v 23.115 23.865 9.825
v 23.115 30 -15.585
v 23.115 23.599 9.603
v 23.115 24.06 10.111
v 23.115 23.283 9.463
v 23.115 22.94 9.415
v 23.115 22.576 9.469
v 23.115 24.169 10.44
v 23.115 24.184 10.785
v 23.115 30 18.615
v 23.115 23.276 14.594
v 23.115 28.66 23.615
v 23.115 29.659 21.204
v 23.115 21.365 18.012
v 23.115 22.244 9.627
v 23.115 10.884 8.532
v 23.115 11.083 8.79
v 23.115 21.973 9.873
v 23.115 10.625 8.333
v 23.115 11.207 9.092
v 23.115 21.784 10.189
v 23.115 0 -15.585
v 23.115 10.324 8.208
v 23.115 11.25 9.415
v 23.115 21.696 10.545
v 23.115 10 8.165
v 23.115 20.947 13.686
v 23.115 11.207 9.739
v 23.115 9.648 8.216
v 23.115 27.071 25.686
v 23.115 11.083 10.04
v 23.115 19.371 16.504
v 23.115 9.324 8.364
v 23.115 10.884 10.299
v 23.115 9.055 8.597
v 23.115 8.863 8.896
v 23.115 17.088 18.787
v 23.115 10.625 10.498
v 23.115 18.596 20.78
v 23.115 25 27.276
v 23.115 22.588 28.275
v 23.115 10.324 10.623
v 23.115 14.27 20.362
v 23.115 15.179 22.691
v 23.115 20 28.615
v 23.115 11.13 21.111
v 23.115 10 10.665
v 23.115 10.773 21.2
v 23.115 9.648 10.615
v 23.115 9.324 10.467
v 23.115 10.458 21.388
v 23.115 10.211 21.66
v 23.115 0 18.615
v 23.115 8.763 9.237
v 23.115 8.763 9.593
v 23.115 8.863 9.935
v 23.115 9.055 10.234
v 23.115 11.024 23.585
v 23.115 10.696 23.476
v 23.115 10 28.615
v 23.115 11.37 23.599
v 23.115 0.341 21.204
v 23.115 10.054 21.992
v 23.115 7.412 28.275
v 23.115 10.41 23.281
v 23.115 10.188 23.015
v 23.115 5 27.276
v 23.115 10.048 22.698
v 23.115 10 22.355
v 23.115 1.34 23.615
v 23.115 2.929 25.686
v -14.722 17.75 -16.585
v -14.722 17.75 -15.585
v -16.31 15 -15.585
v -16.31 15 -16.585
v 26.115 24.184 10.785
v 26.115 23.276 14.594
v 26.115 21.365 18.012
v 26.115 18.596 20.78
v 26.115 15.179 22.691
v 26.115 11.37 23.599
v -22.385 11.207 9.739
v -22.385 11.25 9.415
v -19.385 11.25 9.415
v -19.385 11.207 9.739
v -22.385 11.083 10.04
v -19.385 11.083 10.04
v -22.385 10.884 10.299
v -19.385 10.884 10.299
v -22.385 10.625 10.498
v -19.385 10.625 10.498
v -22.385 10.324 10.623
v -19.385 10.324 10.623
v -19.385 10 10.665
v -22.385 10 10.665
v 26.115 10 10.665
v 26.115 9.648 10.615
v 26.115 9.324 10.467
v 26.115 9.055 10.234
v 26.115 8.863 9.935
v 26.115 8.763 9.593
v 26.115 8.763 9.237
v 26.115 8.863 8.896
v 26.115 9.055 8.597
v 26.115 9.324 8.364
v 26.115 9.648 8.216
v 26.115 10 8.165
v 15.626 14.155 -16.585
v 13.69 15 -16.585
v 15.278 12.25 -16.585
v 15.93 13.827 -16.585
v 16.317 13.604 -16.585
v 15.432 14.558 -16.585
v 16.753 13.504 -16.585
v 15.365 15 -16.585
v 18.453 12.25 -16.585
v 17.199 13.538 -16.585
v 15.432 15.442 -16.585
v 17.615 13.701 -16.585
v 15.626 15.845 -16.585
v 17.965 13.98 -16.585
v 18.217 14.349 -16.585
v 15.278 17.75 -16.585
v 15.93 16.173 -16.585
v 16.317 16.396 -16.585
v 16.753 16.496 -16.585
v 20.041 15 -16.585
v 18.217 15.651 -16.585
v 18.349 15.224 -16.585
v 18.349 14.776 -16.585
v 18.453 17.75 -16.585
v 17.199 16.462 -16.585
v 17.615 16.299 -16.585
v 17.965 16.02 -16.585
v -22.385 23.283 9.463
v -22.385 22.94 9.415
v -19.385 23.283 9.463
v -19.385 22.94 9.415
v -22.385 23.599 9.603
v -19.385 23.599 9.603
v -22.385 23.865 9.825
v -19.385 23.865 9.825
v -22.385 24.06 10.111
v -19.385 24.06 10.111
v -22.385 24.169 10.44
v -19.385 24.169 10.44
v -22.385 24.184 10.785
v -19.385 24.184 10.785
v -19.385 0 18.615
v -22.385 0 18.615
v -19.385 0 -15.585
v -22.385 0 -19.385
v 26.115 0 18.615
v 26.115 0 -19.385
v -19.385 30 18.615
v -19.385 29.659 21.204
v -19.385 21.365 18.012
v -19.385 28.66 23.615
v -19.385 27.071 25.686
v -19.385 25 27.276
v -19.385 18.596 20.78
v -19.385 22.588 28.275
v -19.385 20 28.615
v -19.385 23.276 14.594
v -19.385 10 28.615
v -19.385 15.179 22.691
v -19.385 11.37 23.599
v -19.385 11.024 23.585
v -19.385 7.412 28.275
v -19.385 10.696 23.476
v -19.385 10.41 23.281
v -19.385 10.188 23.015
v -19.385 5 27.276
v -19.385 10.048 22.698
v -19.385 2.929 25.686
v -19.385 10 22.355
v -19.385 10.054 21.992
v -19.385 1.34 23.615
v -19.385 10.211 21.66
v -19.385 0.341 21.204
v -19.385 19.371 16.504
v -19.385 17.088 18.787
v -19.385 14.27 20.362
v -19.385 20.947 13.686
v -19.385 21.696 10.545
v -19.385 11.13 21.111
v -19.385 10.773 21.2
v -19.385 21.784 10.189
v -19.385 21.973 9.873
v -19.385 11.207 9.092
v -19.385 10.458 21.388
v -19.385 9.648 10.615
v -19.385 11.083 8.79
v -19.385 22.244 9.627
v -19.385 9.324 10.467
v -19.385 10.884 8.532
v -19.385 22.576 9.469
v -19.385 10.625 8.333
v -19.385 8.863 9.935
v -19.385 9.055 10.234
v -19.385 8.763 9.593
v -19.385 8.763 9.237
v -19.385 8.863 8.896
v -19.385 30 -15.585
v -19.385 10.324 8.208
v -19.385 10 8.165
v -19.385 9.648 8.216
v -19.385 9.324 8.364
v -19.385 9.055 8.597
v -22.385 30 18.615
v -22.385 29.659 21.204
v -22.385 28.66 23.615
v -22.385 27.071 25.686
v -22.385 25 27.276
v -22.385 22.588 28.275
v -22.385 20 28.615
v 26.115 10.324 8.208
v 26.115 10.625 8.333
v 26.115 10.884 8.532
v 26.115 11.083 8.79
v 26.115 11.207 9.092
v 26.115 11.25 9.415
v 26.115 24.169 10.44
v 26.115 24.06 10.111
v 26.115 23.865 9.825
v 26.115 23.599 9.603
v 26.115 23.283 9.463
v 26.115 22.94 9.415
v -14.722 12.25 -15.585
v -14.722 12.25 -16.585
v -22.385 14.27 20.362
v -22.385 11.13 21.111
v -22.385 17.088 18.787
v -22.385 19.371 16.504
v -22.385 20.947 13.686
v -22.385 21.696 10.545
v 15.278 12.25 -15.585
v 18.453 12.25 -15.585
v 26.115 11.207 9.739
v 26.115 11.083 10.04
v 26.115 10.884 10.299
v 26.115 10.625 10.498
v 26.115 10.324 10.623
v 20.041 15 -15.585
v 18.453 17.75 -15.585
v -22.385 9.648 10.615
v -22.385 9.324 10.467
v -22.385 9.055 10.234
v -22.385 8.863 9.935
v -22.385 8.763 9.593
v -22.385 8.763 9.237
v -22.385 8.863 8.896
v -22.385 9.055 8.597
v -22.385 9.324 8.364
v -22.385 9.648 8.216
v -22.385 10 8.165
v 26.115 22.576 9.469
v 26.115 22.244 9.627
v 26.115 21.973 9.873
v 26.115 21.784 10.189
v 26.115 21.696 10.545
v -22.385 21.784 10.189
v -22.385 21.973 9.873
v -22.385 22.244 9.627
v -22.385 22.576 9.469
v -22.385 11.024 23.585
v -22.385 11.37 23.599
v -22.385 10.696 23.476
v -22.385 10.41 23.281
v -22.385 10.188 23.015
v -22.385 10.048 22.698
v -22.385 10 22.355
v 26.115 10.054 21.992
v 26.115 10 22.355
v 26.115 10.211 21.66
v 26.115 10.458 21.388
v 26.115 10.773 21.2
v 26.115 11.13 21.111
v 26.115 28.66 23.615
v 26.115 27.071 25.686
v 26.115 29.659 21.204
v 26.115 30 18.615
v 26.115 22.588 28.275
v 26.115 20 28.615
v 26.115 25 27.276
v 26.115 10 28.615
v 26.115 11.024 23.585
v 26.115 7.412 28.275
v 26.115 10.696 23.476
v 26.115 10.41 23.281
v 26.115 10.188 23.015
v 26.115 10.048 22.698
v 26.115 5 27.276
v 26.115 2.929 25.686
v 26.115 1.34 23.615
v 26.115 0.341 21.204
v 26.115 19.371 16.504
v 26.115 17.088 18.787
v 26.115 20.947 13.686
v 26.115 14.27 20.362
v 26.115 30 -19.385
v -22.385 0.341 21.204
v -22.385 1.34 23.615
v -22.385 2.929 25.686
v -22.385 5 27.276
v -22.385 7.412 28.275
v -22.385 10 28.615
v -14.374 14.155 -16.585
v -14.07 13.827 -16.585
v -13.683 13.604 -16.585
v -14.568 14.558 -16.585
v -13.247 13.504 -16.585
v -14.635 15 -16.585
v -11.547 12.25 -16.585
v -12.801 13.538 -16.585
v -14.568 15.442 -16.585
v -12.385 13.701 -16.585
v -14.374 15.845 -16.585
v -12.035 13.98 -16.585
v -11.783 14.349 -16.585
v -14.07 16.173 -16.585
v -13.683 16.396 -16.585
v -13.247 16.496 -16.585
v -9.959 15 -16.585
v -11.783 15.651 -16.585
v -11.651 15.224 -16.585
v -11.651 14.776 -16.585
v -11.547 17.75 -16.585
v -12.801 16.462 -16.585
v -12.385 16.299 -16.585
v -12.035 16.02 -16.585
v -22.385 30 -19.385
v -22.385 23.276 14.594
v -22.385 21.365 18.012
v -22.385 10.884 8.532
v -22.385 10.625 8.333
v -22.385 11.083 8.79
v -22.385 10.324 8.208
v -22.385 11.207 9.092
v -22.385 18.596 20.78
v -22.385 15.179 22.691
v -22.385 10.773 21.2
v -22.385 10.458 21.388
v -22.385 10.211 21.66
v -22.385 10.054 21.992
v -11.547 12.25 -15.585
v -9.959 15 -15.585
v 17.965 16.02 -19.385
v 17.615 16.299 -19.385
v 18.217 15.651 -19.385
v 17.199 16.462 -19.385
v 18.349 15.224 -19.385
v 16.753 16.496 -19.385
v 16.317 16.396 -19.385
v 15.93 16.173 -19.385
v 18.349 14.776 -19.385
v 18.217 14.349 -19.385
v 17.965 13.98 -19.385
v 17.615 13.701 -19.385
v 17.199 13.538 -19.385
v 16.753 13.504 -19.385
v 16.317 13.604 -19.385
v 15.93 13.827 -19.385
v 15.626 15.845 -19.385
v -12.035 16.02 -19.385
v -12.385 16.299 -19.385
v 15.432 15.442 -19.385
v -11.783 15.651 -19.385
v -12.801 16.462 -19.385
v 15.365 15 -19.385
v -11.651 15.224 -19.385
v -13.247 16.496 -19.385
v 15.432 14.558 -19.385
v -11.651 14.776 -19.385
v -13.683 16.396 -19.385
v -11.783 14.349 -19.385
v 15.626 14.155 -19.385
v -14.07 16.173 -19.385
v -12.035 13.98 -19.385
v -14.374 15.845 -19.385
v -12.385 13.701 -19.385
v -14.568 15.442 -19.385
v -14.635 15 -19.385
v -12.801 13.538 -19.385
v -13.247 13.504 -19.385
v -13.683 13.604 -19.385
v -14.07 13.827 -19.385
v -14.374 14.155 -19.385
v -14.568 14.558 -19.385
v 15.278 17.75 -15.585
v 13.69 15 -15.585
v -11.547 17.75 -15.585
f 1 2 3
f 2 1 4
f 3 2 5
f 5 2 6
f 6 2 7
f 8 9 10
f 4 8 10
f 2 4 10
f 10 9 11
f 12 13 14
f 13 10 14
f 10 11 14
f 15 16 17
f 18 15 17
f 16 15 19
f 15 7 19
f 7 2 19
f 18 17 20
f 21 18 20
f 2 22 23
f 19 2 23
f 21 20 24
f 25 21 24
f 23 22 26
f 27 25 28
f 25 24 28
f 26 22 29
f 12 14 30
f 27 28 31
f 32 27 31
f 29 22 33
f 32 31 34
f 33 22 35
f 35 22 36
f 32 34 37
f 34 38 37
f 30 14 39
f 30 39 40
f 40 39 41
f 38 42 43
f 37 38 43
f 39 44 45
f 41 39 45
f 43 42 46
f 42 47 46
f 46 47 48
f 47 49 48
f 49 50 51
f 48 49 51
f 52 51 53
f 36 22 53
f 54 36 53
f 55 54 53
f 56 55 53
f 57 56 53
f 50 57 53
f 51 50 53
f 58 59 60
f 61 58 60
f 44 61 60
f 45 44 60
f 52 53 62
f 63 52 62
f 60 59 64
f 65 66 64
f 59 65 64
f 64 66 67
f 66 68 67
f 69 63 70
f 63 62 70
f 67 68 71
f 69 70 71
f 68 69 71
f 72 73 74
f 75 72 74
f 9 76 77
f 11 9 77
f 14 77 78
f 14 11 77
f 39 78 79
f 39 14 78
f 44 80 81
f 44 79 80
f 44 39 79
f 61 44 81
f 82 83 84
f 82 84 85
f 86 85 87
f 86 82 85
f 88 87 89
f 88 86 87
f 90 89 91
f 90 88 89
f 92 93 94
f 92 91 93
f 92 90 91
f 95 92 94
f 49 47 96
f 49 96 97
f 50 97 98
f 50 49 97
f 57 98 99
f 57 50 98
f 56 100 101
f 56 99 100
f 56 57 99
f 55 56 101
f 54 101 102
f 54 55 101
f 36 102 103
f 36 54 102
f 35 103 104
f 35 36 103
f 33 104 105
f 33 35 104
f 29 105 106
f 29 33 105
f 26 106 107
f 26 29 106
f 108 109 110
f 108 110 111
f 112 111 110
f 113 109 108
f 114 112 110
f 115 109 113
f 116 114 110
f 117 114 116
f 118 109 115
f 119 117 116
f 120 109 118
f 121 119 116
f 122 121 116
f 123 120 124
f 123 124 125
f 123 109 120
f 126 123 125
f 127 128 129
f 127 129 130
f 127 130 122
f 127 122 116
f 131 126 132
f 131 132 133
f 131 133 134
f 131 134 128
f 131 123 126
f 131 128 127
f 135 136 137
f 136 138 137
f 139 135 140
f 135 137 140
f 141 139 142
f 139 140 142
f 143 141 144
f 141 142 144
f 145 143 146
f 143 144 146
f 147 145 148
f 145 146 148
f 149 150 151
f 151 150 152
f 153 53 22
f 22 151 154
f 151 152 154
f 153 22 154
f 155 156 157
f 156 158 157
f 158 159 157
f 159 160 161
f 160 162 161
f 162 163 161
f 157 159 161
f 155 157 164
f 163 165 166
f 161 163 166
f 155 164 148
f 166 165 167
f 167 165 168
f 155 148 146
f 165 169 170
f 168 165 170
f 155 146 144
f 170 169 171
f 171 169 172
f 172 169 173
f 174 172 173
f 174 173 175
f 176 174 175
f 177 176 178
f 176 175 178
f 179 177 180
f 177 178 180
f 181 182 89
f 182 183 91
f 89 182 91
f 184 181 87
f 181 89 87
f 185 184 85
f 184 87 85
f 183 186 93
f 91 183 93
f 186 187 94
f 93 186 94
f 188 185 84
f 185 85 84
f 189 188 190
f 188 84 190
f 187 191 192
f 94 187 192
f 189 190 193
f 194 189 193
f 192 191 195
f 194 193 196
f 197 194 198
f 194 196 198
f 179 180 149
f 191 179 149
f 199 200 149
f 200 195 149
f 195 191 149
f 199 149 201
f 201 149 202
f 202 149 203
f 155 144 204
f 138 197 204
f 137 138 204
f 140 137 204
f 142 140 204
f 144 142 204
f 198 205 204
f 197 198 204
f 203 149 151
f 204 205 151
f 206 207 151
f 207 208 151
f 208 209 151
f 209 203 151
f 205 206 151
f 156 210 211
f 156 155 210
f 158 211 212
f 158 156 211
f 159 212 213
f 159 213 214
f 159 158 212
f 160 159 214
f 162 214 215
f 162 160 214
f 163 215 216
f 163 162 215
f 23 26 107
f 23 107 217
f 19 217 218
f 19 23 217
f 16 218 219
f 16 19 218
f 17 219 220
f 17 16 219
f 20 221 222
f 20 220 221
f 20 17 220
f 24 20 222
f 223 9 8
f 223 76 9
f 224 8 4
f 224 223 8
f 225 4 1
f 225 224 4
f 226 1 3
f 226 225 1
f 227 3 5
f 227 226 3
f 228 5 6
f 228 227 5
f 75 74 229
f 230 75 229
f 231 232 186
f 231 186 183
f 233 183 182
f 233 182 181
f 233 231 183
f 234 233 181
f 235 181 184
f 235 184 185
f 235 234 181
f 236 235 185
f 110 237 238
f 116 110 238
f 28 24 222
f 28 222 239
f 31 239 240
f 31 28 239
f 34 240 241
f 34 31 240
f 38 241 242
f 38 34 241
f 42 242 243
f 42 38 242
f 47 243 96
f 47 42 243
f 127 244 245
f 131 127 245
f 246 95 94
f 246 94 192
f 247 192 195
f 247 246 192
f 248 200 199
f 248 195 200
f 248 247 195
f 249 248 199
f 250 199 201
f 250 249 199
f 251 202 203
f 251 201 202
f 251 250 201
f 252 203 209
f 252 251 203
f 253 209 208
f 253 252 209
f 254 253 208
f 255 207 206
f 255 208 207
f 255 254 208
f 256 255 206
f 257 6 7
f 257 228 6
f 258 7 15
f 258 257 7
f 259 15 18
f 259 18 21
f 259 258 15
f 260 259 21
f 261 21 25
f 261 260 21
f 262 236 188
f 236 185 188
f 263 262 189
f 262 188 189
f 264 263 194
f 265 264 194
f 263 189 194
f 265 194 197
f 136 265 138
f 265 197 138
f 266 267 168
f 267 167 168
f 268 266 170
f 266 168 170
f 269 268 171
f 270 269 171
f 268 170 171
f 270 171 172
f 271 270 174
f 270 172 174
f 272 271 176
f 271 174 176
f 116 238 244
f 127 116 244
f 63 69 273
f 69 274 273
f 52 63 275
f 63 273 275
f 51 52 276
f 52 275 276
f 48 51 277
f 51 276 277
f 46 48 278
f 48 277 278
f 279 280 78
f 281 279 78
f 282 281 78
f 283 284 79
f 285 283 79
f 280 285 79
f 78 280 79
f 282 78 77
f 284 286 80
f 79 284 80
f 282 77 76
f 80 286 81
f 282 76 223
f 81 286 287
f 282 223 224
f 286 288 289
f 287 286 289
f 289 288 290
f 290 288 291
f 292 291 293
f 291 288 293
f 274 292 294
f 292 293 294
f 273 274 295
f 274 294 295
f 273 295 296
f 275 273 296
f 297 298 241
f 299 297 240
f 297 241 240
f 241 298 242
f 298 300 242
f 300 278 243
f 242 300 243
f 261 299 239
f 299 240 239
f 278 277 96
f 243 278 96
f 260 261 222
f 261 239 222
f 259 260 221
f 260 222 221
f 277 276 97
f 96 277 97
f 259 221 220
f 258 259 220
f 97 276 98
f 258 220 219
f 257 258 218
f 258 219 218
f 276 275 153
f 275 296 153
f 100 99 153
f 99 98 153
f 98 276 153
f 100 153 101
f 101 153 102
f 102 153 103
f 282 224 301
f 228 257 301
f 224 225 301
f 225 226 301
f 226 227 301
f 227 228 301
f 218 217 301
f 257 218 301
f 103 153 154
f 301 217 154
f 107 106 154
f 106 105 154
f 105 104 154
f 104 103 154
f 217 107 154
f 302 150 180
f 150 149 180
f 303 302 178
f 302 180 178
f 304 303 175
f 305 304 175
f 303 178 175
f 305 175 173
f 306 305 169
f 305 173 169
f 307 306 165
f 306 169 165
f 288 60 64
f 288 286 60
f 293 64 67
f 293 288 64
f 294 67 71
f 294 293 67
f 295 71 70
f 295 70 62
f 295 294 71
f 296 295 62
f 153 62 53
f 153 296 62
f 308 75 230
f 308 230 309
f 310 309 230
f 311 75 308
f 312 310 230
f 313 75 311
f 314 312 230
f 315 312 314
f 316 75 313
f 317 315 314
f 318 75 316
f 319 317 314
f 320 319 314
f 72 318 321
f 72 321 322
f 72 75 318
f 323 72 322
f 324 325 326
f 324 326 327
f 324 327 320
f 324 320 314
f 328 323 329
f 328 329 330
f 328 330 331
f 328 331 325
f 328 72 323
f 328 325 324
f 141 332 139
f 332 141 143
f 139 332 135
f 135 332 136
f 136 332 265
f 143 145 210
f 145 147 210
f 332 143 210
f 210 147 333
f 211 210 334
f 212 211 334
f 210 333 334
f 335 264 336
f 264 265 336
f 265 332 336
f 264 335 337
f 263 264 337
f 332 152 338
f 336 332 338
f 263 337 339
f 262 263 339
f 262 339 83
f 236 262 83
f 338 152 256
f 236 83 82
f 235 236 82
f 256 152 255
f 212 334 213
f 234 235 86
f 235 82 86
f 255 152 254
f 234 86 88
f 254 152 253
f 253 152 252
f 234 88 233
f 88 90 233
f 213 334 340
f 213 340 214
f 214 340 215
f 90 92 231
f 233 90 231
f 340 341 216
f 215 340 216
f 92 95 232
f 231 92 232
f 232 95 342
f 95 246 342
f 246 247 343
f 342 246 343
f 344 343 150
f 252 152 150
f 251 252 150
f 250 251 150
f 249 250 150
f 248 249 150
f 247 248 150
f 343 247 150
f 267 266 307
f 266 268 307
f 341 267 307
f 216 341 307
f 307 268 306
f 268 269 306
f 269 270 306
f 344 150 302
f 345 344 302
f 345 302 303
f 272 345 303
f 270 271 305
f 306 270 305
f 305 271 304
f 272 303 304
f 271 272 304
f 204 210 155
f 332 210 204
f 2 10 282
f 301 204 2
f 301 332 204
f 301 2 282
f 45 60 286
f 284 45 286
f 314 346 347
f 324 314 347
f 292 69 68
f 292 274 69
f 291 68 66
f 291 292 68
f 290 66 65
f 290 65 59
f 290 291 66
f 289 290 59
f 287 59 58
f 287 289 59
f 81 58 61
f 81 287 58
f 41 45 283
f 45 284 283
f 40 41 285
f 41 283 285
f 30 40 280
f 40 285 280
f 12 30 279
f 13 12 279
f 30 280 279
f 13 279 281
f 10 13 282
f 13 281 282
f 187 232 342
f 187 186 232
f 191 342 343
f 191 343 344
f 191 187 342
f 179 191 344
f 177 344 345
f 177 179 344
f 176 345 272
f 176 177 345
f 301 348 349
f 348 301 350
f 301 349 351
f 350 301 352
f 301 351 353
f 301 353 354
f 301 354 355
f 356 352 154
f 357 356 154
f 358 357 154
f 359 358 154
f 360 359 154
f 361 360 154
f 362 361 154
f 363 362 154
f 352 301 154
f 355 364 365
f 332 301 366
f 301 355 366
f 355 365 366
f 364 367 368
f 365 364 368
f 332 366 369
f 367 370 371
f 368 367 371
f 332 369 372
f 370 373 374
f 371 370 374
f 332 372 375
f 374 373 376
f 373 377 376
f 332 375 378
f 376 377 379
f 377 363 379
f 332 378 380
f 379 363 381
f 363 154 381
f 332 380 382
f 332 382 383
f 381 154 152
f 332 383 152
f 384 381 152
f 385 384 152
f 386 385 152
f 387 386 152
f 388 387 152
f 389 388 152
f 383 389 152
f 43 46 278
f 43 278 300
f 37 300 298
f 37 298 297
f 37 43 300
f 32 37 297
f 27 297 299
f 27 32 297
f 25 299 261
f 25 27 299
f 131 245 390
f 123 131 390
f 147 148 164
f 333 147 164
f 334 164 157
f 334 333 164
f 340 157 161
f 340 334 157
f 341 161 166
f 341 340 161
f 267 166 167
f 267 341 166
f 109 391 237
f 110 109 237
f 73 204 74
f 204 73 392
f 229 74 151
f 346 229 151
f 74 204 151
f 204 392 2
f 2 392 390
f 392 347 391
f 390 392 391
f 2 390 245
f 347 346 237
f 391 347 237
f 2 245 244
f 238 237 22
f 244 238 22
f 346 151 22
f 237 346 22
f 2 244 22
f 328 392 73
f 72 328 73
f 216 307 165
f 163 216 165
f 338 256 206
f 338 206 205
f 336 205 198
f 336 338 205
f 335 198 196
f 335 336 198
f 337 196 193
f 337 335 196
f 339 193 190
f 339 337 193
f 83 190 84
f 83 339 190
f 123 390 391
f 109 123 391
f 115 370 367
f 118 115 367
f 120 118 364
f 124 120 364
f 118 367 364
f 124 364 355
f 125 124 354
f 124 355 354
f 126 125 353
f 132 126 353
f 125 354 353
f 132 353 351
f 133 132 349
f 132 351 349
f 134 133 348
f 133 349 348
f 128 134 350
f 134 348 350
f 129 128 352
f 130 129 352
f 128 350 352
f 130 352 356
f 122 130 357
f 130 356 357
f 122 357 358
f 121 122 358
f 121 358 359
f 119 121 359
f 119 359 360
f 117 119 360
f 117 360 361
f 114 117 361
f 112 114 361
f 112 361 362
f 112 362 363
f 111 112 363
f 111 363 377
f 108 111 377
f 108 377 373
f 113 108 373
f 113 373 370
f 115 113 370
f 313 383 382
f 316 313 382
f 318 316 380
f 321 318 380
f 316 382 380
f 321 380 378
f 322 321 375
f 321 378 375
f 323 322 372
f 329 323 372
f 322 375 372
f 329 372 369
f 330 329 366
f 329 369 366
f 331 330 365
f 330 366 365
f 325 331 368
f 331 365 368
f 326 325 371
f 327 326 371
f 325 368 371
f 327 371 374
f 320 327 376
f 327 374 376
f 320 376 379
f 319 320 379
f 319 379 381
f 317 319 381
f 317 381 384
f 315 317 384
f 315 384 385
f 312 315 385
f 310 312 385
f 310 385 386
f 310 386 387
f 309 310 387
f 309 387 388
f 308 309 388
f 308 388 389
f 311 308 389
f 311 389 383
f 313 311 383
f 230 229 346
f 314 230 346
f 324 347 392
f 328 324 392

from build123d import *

# Parameters (mm, degrees)
BOSS_EXTRUDE1_DEPTH     = 30
CUT_EXTRUDE1_DEPTH      = 62.55558656
CUT_EXTRUDE1_DEPTH_BACK = 10
SKETCH4_R               = 1.5
CUT_EXTRUDE2_DEPTH      = 63.337896288
FILLET1_R               = 1.25
FILLET2_R               = 10
CUT_EXTRUDE3_DEPTH      = 1


with BuildPart() as part:
    # Sketch2 → Boss-Extrude1 (new body)
    with BuildSketch(Plane(origin=(0, 0, 0), x_dir=(1, 0, 0), z_dir=(0, 1, 0))):
        Polygon((26.115384615, 19.384615385), (-22.384615385, 19.384615385), (-22.384615385, -28.615384615), (-19.384615385, -28.615384615), (-19.384615385, 15.584615385), (23.115384615, 15.584615385), (23.115384615, -28.615384615), (26.115384615, -28.615384615), align=None)
    extrude(amount=BOSS_EXTRUDE1_DEPTH)

    # Sketch3 → Cut-Extrude1 (cut, two sides: drawn at the far end of the back side and taken through both)
    with BuildSketch(Plane(origin=(-19.384615385, 0, 0), x_dir=(0, 0, -1), z_dir=(1, 0, 0)).offset(-CUT_EXTRUDE1_DEPTH_BACK)):
        with BuildLine():
            ThreePointArc((-21.165384615, 10), (-17.723889294, 18.308504679), (-9.415384615, 21.75))
            Line((-9.415384615, 21.75), (-9.415384615, 24.25))
            ThreePointArc((-9.415384615, 24.25), (-19.491656247, 20.076271632), (-23.665384615, 10))
            Line((-23.665384615, 10), (-21.165384615, 10))
        make_face()
        with BuildLine():
            Line((-10.665384615, 10), (-9.415384615, 10))
            Line((-9.415384615, 10), (-9.415384615, 11.25))
            ThreePointArc((-9.415384615, 11.25), (-10.299268092, 10.883883476), (-10.665384615, 10))
        make_face()
        with BuildLine():
            Line((-9.415384615, 11.25), (-9.415384615, 10))
            Line((-9.415384615, 10), (-10.665384615, 10))
            ThreePointArc((-10.665384615, 10), (-9.415384615, 8.75), (-8.165384615, 10))
            ThreePointArc((-8.165384615, 10), (-8.531501139, 10.883883476), (-9.415384615, 11.25))
        make_face()
    extrude(amount=CUT_EXTRUDE1_DEPTH + CUT_EXTRUDE1_DEPTH_BACK, mode=Mode.SUBTRACT)

    # Sketch4 → Cut-Extrude2 (cut, through all)
    with BuildSketch(Plane(origin=(0, 0, -19.384615385), x_dir=(-1, 0, 0), z_dir=(0, 0, -1))):
        with Locations((-16.865384615, 15)):
            Circle(SKETCH4_R)
        with Locations((13.134615385, 15)):
            Circle(SKETCH4_R)
    extrude(amount=-CUT_EXTRUDE2_DEPTH, mode=Mode.SUBTRACT)

    # Fillet1
    fillet1_edges = [part.edges().sort_by_distance(p)[0] for p in [
        (-20.884615385, 24.25, 9.415384615),
        (-20.884615385, 21.75, 9.415384615),
        (-20.884615385, 10, 21.165384615),
        (-20.884615385, 10, 23.665384615),
        (24.615384615, 10, 23.665384615),
        (24.615384615, 10, 21.165384615),
        (24.615384615, 21.75, 9.415384615),
        (24.615384615, 24.25, 9.415384615),
    ]]
    fillet(fillet1_edges, radius=FILLET1_R - 0.0001)  # a hair under: the kernel refuses the full size

    # Fillet2
    fillet2_edges = [part.edges().sort_by_distance(p)[0] for p in [
        (-20.884615385, 30, 28.615384615),
        (24.615384615, 30, 28.615384615),
        (24.615384615, 0, 28.615384615),
        (-20.884615385, 0, 28.615384615),
    ]]
    fillet(fillet2_edges, radius=FILLET2_R)

    # Sketch5 → Cut-Extrude3 (cut)
    with BuildSketch(Plane.XY.offset(-15.584615385)):
        Polygon((-14.722328625, 12.25), (-11.546902144, 12.25), (-9.959188904, 15), (-11.546902144, 17.75), (-14.722328625, 17.75), (-16.310041865, 15), align=None)
        Polygon((15.277671375, 12.25), (18.453097856, 12.25), (20.040811096, 15), (18.453097856, 17.75), (15.277671375, 17.75), (13.689958135, 15), align=None)
    extrude(amount=-CUT_EXTRUDE3_DEPTH, mode=Mode.SUBTRACT)


solid = part.part
